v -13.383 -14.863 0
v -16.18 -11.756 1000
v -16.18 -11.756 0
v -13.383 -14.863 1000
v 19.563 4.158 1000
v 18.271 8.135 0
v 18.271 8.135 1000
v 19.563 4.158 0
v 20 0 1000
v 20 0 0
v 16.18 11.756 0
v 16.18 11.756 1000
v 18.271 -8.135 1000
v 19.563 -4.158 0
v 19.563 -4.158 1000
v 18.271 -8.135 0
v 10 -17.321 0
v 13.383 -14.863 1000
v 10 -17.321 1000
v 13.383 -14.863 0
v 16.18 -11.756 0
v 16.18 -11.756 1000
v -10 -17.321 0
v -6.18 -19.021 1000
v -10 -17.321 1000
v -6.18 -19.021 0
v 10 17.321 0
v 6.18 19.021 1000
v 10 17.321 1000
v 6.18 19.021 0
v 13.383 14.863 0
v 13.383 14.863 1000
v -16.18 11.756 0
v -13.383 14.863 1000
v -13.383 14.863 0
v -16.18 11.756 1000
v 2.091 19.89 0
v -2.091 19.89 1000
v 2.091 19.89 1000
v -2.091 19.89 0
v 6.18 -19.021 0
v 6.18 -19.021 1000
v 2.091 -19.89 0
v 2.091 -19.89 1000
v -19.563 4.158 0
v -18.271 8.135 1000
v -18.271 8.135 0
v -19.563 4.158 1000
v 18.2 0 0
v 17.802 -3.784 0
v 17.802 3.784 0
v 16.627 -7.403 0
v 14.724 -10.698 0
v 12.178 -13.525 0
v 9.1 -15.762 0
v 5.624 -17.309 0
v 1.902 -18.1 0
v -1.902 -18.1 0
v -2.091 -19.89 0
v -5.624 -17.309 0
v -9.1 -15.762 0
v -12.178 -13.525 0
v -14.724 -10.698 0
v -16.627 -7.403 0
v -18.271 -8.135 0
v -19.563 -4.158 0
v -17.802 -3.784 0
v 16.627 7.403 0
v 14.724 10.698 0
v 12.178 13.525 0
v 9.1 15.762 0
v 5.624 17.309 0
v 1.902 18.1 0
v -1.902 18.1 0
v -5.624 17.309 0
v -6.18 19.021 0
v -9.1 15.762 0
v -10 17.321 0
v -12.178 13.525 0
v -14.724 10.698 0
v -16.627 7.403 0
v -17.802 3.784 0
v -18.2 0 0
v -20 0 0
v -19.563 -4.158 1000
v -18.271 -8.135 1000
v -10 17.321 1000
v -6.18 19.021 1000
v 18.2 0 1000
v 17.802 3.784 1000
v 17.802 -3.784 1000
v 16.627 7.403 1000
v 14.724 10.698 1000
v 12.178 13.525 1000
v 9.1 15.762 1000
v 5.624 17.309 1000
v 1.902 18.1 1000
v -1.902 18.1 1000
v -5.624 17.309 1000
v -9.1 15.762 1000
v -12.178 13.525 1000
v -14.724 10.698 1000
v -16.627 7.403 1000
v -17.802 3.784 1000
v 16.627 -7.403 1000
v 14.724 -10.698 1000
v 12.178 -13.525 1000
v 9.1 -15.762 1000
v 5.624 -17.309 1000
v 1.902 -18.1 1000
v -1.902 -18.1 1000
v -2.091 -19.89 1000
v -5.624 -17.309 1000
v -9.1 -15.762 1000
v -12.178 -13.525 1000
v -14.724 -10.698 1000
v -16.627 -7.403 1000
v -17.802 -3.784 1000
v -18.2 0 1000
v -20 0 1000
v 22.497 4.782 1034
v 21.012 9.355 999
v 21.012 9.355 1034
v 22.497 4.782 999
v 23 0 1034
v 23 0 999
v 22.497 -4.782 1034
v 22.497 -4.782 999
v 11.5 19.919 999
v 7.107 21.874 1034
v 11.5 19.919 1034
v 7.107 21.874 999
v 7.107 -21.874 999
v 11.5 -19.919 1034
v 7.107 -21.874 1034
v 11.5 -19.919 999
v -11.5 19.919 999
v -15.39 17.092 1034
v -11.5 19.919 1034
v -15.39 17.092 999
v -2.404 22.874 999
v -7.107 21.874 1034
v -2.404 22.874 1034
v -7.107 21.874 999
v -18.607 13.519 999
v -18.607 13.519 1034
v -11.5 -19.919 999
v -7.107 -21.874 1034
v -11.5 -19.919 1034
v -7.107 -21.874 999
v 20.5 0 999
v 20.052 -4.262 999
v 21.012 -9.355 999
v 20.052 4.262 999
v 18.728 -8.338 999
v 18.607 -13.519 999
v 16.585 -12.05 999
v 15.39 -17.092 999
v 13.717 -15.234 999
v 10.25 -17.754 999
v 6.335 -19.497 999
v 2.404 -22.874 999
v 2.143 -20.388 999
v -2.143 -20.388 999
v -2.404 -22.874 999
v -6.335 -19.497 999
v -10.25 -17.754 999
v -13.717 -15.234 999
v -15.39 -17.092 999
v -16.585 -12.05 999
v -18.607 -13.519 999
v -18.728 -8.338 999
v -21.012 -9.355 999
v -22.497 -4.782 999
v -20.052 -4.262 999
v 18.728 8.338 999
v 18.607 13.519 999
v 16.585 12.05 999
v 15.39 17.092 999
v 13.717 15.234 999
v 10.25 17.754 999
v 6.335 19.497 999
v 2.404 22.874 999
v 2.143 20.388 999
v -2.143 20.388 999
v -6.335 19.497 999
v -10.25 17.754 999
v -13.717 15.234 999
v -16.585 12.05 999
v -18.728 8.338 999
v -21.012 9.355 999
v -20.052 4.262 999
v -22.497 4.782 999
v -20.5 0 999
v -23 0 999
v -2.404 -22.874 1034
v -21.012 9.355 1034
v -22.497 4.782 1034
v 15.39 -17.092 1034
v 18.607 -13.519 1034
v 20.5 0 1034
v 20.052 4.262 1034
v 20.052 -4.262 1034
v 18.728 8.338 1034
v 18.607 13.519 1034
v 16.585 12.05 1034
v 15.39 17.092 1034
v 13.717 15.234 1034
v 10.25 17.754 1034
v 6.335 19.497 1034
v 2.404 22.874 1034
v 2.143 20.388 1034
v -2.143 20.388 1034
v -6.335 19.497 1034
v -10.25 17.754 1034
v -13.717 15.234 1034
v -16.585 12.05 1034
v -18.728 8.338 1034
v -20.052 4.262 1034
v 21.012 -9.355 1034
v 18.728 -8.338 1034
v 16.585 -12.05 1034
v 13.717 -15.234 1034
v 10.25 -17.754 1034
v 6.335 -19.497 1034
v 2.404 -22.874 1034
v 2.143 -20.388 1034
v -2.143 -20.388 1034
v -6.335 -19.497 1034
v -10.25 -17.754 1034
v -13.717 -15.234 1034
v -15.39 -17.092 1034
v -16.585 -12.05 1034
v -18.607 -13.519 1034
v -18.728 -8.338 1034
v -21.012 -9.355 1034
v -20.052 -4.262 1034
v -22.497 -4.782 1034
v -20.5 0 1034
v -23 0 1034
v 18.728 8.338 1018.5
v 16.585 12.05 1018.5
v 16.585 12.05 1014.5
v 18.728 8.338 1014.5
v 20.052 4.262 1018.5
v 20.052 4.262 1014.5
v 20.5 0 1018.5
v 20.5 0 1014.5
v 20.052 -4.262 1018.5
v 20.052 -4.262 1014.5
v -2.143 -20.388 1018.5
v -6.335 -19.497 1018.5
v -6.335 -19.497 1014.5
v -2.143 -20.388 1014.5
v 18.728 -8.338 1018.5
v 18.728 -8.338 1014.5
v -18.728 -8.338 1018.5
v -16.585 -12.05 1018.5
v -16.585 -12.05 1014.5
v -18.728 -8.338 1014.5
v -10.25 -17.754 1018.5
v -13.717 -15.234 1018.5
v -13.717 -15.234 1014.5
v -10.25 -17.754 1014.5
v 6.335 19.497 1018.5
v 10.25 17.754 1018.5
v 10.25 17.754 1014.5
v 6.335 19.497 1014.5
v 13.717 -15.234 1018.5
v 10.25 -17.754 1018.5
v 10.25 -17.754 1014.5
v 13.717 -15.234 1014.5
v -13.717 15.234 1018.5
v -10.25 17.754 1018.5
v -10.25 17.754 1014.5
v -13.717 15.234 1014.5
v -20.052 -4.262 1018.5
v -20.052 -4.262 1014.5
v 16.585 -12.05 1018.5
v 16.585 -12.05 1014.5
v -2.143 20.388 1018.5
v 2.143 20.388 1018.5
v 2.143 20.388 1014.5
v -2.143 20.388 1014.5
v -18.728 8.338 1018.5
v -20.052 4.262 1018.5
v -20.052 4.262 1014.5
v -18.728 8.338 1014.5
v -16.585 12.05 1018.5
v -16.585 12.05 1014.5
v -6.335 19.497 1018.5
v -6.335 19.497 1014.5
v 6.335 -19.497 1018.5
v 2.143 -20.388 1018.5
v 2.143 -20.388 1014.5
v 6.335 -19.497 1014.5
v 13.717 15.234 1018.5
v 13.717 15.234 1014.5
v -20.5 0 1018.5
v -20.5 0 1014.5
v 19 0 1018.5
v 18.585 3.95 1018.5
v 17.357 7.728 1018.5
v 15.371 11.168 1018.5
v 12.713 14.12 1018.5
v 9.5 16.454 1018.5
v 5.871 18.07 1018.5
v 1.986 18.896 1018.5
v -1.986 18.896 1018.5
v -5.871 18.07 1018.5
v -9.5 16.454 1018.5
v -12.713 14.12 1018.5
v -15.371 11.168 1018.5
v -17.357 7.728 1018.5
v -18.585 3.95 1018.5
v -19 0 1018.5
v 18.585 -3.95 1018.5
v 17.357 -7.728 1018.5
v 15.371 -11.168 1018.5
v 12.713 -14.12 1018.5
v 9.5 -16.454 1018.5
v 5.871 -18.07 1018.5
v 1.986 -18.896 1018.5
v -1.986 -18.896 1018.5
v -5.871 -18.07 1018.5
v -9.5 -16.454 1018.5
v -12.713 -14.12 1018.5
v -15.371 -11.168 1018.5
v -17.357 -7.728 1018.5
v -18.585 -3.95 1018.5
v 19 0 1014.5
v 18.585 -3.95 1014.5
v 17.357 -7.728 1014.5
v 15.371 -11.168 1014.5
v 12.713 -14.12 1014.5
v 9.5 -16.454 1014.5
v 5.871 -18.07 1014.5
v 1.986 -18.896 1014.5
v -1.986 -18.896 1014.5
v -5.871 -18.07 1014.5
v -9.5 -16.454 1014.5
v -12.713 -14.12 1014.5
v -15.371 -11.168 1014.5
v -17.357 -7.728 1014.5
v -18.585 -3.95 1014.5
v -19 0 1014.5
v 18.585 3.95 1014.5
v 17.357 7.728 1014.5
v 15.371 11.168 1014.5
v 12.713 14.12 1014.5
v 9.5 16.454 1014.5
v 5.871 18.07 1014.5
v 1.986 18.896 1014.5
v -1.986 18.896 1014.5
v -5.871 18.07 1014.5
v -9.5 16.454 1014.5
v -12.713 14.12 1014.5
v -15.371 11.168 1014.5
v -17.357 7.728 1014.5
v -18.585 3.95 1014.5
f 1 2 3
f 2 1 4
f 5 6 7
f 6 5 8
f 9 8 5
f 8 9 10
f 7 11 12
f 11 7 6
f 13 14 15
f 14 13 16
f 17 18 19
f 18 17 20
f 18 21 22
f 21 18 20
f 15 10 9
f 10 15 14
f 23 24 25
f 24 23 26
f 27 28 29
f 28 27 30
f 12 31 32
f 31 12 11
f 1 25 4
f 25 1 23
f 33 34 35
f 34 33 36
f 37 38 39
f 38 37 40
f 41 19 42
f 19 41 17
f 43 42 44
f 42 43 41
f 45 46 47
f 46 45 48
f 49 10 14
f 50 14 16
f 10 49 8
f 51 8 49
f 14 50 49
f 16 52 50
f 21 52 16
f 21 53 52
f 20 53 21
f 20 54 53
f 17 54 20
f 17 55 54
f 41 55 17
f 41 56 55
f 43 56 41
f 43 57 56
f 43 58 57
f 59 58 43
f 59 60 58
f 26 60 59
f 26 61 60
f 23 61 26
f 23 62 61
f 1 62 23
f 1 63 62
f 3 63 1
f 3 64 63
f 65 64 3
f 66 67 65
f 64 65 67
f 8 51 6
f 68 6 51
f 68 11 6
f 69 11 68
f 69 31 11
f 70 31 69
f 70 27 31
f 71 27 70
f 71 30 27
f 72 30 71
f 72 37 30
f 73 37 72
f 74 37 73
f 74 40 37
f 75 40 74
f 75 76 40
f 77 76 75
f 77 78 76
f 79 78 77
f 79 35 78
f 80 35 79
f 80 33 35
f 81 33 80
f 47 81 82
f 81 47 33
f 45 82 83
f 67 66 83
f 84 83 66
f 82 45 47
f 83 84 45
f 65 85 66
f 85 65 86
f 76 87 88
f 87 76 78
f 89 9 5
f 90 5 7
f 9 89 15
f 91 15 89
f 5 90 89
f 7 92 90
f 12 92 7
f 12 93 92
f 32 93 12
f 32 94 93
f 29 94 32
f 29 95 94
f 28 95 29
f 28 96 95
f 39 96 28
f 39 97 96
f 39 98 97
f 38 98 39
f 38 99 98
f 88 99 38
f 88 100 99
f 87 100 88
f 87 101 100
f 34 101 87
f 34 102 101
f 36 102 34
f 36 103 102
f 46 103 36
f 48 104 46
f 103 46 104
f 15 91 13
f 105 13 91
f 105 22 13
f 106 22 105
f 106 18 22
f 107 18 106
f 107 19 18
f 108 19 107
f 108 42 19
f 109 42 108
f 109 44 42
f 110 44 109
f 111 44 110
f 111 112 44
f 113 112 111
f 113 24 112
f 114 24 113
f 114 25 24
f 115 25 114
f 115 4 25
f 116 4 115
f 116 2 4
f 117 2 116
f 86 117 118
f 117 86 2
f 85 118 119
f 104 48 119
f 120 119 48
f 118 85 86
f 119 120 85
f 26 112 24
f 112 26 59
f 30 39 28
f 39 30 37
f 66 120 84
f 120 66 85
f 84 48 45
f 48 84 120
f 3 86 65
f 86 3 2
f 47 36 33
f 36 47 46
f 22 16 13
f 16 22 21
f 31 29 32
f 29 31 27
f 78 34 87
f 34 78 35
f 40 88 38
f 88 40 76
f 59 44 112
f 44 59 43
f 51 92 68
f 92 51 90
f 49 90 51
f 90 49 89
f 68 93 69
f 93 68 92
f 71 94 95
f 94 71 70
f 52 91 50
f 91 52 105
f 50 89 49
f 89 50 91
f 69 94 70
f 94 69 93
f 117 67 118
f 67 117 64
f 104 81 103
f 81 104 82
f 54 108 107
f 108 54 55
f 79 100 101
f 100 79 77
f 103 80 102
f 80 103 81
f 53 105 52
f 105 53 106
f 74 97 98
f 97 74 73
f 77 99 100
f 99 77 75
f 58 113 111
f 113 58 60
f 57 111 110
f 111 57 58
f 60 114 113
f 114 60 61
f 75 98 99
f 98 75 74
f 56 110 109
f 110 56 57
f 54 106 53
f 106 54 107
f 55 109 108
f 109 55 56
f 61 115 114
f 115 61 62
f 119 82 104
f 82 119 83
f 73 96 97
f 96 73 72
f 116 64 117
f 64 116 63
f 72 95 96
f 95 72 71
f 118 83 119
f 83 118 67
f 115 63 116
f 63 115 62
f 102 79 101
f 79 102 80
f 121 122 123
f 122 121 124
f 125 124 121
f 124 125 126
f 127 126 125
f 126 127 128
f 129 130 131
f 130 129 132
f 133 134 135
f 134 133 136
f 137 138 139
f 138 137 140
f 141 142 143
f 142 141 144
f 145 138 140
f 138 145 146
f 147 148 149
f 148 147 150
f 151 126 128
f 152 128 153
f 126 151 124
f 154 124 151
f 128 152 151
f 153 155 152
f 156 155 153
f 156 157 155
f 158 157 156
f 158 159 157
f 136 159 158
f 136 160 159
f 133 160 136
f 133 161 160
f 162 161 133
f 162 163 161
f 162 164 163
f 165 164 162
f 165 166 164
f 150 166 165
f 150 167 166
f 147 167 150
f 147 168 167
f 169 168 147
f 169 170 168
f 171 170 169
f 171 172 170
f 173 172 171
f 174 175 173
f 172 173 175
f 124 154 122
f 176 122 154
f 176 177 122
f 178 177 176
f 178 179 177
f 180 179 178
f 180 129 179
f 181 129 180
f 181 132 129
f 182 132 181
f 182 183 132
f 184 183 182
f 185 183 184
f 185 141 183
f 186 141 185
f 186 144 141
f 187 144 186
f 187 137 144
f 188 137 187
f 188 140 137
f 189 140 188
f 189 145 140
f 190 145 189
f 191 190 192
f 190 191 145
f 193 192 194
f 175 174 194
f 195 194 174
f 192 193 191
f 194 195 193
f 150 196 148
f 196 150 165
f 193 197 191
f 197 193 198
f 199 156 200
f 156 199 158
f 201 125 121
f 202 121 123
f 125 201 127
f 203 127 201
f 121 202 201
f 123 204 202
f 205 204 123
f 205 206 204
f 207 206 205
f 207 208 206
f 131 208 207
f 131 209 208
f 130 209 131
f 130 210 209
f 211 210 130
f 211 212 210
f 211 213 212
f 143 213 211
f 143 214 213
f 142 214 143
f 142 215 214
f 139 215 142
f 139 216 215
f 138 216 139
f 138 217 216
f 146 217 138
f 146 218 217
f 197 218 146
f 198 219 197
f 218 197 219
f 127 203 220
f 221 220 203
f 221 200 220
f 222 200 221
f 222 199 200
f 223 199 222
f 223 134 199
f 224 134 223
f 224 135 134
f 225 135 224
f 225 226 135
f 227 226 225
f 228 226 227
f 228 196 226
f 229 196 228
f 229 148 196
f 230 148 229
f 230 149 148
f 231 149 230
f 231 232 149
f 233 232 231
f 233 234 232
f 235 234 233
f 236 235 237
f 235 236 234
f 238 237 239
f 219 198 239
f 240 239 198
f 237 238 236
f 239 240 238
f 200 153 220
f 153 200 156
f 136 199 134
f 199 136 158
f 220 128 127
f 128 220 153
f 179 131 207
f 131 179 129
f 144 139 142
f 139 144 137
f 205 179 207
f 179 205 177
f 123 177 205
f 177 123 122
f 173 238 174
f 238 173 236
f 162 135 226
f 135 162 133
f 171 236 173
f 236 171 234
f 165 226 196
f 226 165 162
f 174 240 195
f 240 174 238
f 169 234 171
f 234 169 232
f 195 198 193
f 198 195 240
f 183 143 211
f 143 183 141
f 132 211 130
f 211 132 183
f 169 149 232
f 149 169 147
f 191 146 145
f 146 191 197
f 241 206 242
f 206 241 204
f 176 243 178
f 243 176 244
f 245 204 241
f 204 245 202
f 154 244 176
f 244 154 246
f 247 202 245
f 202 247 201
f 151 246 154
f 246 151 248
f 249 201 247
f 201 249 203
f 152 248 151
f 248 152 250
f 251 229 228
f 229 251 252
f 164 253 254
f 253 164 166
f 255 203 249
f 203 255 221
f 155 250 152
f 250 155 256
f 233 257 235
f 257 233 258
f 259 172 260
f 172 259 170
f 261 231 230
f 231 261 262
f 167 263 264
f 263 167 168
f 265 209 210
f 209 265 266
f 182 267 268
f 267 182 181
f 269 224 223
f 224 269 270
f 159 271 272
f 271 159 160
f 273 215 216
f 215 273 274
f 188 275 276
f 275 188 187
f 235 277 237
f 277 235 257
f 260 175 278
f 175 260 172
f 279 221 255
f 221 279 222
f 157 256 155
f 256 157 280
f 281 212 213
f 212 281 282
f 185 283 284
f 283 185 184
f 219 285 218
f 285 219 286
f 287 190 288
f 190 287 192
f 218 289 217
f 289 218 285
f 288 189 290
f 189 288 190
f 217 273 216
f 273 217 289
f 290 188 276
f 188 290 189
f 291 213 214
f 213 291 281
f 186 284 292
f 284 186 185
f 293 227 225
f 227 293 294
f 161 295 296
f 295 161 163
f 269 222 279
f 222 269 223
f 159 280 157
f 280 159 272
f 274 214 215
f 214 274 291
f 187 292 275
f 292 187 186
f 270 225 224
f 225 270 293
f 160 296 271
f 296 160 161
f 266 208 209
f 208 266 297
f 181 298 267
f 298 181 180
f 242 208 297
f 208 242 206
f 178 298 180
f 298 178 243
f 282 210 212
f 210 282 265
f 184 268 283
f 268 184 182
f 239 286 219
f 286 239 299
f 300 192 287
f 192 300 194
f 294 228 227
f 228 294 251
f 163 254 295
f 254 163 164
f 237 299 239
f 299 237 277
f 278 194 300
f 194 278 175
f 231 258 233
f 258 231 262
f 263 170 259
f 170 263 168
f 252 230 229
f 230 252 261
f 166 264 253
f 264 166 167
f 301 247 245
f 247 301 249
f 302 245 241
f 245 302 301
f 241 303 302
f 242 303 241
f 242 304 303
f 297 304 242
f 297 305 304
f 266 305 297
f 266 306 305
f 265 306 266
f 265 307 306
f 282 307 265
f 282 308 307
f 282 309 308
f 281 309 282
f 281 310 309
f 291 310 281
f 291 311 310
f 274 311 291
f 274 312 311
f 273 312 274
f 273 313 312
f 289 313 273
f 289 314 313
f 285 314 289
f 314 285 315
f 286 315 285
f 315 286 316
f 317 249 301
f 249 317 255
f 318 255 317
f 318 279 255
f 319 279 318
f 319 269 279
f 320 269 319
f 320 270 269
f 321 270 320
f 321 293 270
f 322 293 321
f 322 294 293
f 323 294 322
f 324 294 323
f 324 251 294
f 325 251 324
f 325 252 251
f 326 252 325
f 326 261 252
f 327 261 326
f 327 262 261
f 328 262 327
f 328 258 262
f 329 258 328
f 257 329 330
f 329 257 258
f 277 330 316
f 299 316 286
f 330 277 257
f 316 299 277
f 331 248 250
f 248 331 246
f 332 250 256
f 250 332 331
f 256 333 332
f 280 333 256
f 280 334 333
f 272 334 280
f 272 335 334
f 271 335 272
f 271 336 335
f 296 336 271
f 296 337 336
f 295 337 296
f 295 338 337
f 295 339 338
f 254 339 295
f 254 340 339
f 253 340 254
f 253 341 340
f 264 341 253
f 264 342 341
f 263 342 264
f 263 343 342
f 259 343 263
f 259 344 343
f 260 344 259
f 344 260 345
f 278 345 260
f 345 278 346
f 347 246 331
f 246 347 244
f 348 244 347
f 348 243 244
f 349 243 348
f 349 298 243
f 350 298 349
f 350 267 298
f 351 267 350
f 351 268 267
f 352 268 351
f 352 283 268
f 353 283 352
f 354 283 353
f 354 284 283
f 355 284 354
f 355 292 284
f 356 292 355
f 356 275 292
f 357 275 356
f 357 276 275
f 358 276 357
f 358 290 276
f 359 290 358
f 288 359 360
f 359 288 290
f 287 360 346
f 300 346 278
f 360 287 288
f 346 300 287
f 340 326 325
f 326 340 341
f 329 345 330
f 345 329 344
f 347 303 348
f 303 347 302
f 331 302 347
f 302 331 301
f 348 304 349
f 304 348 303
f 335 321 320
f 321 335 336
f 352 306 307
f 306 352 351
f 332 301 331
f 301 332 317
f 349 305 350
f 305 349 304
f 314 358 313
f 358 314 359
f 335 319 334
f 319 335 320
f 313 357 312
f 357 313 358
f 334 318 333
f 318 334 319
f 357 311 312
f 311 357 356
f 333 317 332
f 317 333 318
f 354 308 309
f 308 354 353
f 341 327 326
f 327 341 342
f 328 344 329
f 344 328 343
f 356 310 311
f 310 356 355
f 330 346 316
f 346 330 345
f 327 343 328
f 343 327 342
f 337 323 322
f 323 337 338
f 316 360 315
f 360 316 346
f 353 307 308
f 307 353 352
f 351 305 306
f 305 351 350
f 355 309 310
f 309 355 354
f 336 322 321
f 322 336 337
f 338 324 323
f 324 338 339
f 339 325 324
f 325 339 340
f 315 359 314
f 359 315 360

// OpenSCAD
// Parameters
pipe_standard = 1; //[1:1:1]
nominal_size = 40; //[20:80:1]
length_mm = 1000; //[500:2000:10]
include_end_fitting = 1; //[0:1:1]
od_mm = 40; //[20:80:1]
wall_mm = 1.8; //[0.9:3.6:0.1]
id_mm = 36.4; //[18:76:0.1]
eps = 1; //[0.5:2:0.1]
fitting_len = 35; //[15:70:1]
fitting_od = 46; //[40:70:1]
fitting_wall = 2.5; //[1.2:5:0.1]
fitting_id = 41; //[30:80:0.1]
fitting_stop_len = 4; //[2:10:0.5]
fitting_stop_thk = 1.5; //[0.5:4:0.1]

// HT Pipe - complete geometry
module ht_pipe() {
  color([0.85, 0.85, 0.8]) {
    // Pipe segment
    difference() {
      cylinder(h=length_mm, r=od_mm/2, center=false);
      translate([0, 0, -eps])
        cylinder(h=length_mm + 2*eps, r=id_mm/2, center=false);
    }
    
    // End fitting geometry
    if (include_end_fitting) {
      translate([0, 0, length_mm - eps]) {
        // Fitting sleeve
        difference() {
          cylinder(h=fitting_len, r=fitting_od/2, center=false);
          translate([0, 0, -eps])
            cylinder(h=fitting_len + 2*eps, r=fitting_id/2, center=false);
        }
        
        // Fitting stop ring
        translate([0, 0, fitting_len/2 - fitting_stop_len/2]) {
          difference() {
            cylinder(h=fitting_stop_len, r=fitting_id/2, center=false);
            translate([0, 0, -eps])
              cylinder(h=fitting_stop_len + 2*eps, r=fitting_id/2 - fitting_stop_thk, center=false);
          }
        }
      }
    }
  }
}

// Assembly
module assembly() {
  ht_pipe();
}

assembly();
